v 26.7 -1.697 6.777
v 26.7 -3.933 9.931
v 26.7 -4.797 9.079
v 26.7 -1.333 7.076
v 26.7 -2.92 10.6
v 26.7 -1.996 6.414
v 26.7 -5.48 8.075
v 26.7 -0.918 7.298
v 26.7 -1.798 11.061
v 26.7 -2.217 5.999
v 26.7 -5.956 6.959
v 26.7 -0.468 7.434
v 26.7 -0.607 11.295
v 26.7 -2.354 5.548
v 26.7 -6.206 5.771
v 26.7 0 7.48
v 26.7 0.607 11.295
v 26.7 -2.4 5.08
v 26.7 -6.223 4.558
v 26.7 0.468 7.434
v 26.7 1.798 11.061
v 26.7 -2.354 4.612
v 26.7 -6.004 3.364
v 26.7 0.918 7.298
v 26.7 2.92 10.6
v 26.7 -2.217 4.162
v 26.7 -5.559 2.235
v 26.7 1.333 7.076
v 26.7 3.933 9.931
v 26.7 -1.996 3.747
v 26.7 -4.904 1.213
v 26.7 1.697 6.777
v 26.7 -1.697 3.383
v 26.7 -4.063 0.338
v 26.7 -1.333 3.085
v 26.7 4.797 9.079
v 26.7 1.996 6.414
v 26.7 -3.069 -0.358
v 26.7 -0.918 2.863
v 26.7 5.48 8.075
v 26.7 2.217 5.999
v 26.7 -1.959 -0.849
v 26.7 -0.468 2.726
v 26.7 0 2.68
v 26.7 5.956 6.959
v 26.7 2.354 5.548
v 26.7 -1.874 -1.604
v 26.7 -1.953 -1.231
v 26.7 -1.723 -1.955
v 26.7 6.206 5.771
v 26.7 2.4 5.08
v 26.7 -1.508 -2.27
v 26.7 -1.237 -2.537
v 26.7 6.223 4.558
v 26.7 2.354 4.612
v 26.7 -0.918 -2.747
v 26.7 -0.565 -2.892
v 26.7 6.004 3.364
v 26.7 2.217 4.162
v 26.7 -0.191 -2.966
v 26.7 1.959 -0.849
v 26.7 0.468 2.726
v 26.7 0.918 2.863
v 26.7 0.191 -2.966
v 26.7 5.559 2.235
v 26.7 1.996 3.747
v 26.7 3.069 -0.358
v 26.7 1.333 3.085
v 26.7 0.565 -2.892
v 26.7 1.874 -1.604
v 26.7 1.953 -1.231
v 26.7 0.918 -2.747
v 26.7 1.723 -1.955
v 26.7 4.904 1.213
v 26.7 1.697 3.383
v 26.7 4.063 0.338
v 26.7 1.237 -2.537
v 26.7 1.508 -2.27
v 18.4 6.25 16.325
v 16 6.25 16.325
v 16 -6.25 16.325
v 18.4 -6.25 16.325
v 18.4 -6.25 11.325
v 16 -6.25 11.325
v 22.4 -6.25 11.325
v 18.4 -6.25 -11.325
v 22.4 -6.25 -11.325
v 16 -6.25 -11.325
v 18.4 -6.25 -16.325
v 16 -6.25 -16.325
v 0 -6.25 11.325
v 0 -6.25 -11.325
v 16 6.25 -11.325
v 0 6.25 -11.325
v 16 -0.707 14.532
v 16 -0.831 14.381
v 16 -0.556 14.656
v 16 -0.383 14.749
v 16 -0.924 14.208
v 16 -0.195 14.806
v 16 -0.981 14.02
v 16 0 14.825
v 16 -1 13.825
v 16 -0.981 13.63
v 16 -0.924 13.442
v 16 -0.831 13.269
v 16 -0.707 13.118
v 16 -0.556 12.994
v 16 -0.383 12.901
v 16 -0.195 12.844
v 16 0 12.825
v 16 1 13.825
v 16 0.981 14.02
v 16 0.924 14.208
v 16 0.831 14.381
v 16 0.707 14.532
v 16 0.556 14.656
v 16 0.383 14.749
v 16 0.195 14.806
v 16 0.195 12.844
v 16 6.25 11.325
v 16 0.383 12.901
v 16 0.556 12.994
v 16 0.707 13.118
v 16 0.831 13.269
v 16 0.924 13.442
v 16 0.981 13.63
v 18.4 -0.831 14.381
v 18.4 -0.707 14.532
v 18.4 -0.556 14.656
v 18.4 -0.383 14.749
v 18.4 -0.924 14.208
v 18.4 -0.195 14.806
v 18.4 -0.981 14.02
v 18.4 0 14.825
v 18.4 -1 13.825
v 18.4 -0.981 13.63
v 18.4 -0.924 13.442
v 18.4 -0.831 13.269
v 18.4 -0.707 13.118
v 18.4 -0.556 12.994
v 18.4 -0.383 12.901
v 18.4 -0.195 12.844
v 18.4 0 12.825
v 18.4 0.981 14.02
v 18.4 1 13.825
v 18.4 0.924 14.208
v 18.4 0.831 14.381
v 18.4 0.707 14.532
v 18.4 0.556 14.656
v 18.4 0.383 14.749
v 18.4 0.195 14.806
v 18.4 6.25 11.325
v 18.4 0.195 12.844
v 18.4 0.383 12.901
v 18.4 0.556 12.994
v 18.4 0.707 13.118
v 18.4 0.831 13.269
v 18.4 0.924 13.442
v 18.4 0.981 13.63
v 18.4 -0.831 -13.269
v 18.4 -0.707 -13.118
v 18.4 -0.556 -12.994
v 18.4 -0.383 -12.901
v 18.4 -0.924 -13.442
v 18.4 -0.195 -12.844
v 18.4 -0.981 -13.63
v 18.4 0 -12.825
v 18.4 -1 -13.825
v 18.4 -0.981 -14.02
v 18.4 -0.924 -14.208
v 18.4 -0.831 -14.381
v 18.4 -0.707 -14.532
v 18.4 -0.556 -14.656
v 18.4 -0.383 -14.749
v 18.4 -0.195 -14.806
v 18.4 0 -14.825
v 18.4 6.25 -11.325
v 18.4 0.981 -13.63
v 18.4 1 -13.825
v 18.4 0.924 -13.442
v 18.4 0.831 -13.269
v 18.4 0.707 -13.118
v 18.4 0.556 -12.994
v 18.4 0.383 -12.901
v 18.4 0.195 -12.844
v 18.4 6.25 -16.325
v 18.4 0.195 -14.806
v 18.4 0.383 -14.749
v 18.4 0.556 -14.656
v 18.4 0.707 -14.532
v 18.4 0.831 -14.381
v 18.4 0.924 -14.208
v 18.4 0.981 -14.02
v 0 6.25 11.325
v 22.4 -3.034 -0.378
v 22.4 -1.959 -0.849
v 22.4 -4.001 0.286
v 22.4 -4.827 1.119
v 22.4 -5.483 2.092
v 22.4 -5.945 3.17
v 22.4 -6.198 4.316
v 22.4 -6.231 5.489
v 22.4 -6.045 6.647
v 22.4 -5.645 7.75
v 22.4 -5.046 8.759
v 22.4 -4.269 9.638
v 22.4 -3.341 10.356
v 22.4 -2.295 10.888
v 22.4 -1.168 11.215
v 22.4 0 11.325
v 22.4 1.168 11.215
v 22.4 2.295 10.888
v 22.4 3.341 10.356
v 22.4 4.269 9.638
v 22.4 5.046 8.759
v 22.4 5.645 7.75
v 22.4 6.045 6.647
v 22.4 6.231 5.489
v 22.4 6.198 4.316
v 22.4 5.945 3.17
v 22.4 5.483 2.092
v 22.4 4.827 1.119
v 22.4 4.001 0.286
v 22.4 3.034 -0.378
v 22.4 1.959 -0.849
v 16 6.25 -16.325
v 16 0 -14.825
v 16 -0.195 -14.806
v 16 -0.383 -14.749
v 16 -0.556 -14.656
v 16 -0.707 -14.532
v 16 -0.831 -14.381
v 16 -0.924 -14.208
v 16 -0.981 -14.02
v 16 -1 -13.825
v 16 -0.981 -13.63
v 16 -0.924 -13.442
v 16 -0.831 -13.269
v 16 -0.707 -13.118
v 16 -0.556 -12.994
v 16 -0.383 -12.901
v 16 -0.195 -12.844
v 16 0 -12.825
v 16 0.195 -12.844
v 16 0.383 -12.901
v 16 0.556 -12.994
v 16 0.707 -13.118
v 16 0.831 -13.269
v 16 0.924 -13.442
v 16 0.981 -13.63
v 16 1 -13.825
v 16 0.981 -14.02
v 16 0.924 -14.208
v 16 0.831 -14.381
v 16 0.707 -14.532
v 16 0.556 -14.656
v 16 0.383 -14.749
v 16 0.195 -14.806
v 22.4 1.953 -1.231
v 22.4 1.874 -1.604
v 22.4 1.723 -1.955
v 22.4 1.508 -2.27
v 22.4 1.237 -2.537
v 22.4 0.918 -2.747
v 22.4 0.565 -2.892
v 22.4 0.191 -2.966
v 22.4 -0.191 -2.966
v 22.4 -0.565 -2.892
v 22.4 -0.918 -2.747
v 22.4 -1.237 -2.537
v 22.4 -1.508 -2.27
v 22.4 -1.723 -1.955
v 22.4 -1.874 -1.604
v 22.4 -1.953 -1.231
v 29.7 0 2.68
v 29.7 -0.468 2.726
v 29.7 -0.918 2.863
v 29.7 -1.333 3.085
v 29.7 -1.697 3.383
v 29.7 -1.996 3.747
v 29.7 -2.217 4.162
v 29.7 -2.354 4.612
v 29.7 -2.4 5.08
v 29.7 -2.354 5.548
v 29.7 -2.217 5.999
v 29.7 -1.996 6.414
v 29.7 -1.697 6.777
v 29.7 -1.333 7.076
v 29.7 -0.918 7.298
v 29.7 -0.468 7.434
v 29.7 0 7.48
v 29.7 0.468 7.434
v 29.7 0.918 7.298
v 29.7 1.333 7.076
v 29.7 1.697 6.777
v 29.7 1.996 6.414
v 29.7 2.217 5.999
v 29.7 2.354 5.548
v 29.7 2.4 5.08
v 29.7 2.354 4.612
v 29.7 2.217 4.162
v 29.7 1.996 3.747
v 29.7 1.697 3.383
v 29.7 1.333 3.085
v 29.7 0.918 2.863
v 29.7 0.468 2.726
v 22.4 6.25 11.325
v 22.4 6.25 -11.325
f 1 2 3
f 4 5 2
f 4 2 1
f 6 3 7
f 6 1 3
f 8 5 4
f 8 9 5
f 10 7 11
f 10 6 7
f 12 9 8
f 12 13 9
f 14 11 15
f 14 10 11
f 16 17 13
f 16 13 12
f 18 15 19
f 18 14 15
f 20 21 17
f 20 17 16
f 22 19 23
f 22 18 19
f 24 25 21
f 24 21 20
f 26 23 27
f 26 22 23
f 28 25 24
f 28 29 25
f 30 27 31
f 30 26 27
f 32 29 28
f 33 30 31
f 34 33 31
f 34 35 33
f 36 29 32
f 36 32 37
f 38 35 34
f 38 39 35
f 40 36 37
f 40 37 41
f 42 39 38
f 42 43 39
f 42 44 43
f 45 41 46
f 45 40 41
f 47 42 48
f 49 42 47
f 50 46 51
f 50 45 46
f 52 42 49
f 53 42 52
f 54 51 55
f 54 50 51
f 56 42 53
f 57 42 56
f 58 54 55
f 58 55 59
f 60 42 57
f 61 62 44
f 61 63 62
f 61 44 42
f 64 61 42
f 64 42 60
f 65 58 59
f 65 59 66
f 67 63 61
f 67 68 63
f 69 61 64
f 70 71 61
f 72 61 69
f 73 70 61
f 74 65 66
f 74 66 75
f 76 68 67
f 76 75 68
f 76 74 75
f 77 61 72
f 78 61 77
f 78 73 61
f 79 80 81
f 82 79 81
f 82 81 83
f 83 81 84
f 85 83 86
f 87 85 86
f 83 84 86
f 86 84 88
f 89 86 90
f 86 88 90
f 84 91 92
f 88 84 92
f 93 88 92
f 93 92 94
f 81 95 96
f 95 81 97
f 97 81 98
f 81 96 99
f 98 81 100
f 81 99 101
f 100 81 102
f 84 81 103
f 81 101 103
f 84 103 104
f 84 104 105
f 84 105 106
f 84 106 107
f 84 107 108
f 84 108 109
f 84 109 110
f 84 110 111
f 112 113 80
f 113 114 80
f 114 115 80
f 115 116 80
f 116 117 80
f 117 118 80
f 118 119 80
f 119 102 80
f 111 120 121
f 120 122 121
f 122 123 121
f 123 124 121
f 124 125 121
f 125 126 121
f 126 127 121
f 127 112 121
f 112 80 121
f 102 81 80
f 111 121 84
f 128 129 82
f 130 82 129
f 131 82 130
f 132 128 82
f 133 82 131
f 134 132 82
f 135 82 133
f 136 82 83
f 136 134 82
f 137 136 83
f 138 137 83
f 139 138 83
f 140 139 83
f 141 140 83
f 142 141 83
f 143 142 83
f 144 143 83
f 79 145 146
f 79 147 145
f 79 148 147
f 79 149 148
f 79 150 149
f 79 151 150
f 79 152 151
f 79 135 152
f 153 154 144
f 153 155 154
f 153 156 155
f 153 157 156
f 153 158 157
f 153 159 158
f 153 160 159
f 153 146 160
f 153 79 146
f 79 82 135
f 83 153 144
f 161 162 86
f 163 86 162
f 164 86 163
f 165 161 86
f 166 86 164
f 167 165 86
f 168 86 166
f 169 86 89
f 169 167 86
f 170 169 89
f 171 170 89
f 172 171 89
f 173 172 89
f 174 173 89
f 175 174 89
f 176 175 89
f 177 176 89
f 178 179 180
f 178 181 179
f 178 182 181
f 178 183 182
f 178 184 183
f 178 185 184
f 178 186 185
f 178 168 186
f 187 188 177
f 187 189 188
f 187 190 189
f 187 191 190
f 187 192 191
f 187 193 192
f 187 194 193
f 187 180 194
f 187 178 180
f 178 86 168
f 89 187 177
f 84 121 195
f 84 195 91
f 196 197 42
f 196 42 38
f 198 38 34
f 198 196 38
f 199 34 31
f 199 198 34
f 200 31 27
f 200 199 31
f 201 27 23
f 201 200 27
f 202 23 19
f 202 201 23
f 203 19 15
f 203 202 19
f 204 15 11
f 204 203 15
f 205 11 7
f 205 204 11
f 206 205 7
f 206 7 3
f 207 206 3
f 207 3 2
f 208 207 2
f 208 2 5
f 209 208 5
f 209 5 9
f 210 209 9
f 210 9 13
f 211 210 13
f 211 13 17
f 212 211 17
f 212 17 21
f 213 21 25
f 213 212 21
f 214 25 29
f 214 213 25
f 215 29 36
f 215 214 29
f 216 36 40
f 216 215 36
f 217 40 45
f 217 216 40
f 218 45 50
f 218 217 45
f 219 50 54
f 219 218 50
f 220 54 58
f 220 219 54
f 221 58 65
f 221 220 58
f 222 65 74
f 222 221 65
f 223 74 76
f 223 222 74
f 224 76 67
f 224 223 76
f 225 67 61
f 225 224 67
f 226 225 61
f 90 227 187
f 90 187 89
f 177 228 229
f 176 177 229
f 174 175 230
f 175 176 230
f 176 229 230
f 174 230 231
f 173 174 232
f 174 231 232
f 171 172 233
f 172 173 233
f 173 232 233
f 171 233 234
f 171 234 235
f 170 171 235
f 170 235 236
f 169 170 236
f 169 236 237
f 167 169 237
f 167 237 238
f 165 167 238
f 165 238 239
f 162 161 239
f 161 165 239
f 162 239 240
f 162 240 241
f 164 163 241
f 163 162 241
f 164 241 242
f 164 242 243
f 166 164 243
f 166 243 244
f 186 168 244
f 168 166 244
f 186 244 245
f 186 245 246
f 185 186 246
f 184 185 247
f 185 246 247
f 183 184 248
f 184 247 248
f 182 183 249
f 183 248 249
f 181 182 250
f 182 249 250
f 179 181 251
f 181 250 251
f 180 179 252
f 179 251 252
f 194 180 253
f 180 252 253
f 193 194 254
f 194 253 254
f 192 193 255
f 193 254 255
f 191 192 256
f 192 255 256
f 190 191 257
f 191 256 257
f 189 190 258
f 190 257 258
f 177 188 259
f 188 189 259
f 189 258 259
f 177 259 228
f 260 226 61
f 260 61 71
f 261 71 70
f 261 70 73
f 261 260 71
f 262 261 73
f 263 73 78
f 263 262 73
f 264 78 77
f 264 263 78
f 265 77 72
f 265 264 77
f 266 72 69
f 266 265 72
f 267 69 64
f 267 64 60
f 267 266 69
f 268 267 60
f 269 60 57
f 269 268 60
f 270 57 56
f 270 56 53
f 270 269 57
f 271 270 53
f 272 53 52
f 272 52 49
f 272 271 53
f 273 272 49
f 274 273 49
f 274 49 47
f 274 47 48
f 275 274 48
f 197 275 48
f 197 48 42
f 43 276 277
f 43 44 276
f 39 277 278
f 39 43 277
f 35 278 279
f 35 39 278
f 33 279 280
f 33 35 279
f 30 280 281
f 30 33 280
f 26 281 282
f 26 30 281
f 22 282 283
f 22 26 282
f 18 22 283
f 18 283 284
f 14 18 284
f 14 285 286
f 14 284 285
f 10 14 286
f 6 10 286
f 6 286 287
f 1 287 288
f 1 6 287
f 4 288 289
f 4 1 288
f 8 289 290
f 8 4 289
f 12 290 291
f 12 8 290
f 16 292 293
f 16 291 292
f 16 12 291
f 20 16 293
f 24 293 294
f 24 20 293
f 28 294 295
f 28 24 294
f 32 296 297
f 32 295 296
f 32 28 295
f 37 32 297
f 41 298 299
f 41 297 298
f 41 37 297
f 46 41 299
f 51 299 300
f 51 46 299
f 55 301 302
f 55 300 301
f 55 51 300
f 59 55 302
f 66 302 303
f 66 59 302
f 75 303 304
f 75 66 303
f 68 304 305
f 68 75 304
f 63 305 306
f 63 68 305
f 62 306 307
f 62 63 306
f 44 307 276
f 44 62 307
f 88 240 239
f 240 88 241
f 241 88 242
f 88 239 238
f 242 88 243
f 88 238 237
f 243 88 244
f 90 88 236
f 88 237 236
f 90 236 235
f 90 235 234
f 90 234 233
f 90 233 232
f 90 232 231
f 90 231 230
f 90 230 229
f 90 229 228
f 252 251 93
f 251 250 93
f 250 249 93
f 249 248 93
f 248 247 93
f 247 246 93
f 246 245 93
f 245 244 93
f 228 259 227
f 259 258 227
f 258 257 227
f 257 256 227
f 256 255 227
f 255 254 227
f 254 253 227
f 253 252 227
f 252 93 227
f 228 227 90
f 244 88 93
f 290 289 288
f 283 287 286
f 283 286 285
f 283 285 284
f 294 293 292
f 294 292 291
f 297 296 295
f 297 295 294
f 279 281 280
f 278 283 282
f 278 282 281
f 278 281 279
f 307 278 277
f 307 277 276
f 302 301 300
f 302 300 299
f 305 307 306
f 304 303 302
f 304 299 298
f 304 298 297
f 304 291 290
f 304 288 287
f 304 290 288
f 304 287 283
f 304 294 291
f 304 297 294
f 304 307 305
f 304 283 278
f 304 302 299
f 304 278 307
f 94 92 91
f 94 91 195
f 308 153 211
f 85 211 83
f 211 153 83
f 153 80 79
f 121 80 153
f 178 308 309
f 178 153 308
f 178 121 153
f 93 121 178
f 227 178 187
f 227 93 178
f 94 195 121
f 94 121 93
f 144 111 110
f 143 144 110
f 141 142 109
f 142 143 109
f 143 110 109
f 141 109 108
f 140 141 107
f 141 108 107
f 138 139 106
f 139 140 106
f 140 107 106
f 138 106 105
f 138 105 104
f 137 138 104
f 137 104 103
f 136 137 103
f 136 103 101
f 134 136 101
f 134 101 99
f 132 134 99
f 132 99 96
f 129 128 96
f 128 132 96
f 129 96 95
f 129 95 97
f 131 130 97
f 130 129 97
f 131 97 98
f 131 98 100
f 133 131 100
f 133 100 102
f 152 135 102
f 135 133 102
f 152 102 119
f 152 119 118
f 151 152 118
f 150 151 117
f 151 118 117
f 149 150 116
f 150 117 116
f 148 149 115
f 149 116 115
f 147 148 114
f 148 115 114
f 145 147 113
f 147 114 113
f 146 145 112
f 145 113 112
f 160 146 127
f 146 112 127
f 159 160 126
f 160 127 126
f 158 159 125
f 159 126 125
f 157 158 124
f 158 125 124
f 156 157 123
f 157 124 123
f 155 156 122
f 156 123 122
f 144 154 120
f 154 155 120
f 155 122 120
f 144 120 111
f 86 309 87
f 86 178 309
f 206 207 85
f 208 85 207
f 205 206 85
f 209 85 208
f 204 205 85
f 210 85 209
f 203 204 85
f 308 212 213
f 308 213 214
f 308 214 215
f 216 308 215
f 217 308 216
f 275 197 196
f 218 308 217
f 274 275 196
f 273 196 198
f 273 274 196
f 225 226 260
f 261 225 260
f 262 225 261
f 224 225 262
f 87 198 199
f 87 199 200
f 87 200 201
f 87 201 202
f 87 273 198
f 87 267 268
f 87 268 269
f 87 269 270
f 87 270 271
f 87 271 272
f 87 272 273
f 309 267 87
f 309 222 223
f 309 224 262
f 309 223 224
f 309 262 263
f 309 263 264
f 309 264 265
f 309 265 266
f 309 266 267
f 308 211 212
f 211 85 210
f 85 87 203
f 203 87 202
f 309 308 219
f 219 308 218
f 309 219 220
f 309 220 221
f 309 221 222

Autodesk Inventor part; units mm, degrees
ref_plane "YZ Plane" through (0, 0, 0) normal (1, 0, 0) x (0, 1, 0)
ref_plane "XZ Plane" through (0, 0, 0) normal (0, 1, 0) x (-1, 0, 0)
ref_plane "XY Plane" through (0, 0, 0) normal (0, 0, 1) x (1, 0, 0)
sketch "スケッチ1" plane through (0, 0, 0) normal (1, 0, 0) x (0, 1, 0)
  line L0 (6.25, 11.325) -> (-6.25, 11.325)
  line L1 (-6.25, 11.325) -> (-6.25, -11.325)
  line L2 (-6.25, -11.325) -> (6.25, -11.325)
  line L3 (6.25, -11.325) -> (6.25, 11.325)
  point P0 (0, 0)
  dimension "d0" = 22.65
  dimension "d1" = 12.5
  dimension "d4" = 6.25
  dimension "d5" = 6.25
  dimension "d6" = 11.325
  dimension "d7" = 11.325
extrude "押し出し1" add sketch "スケッチ1" along normal blind 16
sketch "スケッチ2" plane through (16, 0, 0) normal (1, 0, 0) x (0, 0, -1)
  line L0 (-11.325, 6.25) -> (-11.325, -6.25) projected
  line L1 (-11.325, 6.25) -> (-16.325, 6.25)
  line L2 (-16.325, 6.25) -> (-16.325, -6.25)
  line L3 (-16.325, -6.25) -> (-11.325, -6.25)
  line L4 (-11.325, -6.25) -> (-11.325, 6.25)
  line L5 (11.325, -6.25) -> (11.325, 6.25) projected
  line L6 (11.325, 6.25) -> (16.325, 6.25)
  line L7 (16.325, 6.25) -> (16.325, -6.25)
  line L8 (16.325, -6.25) -> (11.325, -6.25)
  line L9 (11.325, -6.25) -> (11.325, 6.25)
  circle A0 centre (-13.825, 0) radius 1
  circle A1 centre (13.825, 0) radius 1
  line L10 (-11.325, -6.25) -> (11.325, -6.25) projected
  line L11 (-11.325, 6.25) -> (11.325, 6.25)
  line L12 (11.325, 6.25) -> (11.325, -6.25)
  line L13 (11.325, -6.25) -> (-11.325, -6.25)
  line L14 (-11.325, -6.25) -> (-11.325, 6.25)
  point P0 (0, 0)
  dimension "d8" = 5
  dimension "d9" = 5
  dimension "d10" = 1.5
  dimension "d11" = 1.5
  dimension "d12" = 2
  dimension "d13" = 2
extrude "押し出し2" add sketch "スケッチ2" along normal blind 2.4
sketch "スケッチ3" plane through (18.4, 0, 0) normal (1, 0, 0) x (0, 0, -1)
  line L0 (-11.325, 6.25) -> (-11.325, -6.25) projected
  line L1 (11.325, -6.25) -> (16.325, -6.25) projected
  line L2 (-11.325, 6.25) -> (11.325, 6.25)
  line L3 (11.325, 6.25) -> (11.325, -6.25)
  line L4 (11.325, -6.25) -> (-11.325, -6.25)
  line L5 (-11.325, -6.25) -> (-11.325, 6.25)
  point P0 (0, 0)
extrude "押し出し3" add sketch "スケッチ3" along normal blind 4
sketch "スケッチ4" plane through (22.4, 0, 0) normal (1, 0, 0) x (0, 0, -1)
  circle A0 centre (-5.0802, 0) radius 6.2448
  line L0 (-11.325, 6.25) -> (-11.325, -6.25) projected
  circle A1 centre (1.0094, 0) radius 1.9656
  circle A2 centre (-5.0802, 0) radius 2.4
  point P0 (0, 0)
  dimension "d18" = 0
  dimension "d19" = 12.4895
  dimension "d20" = 3.9311
  dimension "d21" = 14.3
  dimension "d22" = 4.8
extrude "押し出し4" add sketch "スケッチ4" along normal blind 4.3
sketch "スケッチ5" plane through (22.4, 0, 5.0802) normal (1, 0, 0) x (0, 0, -1)
  circle A0 centre (0, 0) radius 2.4
  point P0 (5.0802, 0)
extrude "押し出し5" add sketch "スケッチ5" along normal blind 7.3
properties part number "microservo"
